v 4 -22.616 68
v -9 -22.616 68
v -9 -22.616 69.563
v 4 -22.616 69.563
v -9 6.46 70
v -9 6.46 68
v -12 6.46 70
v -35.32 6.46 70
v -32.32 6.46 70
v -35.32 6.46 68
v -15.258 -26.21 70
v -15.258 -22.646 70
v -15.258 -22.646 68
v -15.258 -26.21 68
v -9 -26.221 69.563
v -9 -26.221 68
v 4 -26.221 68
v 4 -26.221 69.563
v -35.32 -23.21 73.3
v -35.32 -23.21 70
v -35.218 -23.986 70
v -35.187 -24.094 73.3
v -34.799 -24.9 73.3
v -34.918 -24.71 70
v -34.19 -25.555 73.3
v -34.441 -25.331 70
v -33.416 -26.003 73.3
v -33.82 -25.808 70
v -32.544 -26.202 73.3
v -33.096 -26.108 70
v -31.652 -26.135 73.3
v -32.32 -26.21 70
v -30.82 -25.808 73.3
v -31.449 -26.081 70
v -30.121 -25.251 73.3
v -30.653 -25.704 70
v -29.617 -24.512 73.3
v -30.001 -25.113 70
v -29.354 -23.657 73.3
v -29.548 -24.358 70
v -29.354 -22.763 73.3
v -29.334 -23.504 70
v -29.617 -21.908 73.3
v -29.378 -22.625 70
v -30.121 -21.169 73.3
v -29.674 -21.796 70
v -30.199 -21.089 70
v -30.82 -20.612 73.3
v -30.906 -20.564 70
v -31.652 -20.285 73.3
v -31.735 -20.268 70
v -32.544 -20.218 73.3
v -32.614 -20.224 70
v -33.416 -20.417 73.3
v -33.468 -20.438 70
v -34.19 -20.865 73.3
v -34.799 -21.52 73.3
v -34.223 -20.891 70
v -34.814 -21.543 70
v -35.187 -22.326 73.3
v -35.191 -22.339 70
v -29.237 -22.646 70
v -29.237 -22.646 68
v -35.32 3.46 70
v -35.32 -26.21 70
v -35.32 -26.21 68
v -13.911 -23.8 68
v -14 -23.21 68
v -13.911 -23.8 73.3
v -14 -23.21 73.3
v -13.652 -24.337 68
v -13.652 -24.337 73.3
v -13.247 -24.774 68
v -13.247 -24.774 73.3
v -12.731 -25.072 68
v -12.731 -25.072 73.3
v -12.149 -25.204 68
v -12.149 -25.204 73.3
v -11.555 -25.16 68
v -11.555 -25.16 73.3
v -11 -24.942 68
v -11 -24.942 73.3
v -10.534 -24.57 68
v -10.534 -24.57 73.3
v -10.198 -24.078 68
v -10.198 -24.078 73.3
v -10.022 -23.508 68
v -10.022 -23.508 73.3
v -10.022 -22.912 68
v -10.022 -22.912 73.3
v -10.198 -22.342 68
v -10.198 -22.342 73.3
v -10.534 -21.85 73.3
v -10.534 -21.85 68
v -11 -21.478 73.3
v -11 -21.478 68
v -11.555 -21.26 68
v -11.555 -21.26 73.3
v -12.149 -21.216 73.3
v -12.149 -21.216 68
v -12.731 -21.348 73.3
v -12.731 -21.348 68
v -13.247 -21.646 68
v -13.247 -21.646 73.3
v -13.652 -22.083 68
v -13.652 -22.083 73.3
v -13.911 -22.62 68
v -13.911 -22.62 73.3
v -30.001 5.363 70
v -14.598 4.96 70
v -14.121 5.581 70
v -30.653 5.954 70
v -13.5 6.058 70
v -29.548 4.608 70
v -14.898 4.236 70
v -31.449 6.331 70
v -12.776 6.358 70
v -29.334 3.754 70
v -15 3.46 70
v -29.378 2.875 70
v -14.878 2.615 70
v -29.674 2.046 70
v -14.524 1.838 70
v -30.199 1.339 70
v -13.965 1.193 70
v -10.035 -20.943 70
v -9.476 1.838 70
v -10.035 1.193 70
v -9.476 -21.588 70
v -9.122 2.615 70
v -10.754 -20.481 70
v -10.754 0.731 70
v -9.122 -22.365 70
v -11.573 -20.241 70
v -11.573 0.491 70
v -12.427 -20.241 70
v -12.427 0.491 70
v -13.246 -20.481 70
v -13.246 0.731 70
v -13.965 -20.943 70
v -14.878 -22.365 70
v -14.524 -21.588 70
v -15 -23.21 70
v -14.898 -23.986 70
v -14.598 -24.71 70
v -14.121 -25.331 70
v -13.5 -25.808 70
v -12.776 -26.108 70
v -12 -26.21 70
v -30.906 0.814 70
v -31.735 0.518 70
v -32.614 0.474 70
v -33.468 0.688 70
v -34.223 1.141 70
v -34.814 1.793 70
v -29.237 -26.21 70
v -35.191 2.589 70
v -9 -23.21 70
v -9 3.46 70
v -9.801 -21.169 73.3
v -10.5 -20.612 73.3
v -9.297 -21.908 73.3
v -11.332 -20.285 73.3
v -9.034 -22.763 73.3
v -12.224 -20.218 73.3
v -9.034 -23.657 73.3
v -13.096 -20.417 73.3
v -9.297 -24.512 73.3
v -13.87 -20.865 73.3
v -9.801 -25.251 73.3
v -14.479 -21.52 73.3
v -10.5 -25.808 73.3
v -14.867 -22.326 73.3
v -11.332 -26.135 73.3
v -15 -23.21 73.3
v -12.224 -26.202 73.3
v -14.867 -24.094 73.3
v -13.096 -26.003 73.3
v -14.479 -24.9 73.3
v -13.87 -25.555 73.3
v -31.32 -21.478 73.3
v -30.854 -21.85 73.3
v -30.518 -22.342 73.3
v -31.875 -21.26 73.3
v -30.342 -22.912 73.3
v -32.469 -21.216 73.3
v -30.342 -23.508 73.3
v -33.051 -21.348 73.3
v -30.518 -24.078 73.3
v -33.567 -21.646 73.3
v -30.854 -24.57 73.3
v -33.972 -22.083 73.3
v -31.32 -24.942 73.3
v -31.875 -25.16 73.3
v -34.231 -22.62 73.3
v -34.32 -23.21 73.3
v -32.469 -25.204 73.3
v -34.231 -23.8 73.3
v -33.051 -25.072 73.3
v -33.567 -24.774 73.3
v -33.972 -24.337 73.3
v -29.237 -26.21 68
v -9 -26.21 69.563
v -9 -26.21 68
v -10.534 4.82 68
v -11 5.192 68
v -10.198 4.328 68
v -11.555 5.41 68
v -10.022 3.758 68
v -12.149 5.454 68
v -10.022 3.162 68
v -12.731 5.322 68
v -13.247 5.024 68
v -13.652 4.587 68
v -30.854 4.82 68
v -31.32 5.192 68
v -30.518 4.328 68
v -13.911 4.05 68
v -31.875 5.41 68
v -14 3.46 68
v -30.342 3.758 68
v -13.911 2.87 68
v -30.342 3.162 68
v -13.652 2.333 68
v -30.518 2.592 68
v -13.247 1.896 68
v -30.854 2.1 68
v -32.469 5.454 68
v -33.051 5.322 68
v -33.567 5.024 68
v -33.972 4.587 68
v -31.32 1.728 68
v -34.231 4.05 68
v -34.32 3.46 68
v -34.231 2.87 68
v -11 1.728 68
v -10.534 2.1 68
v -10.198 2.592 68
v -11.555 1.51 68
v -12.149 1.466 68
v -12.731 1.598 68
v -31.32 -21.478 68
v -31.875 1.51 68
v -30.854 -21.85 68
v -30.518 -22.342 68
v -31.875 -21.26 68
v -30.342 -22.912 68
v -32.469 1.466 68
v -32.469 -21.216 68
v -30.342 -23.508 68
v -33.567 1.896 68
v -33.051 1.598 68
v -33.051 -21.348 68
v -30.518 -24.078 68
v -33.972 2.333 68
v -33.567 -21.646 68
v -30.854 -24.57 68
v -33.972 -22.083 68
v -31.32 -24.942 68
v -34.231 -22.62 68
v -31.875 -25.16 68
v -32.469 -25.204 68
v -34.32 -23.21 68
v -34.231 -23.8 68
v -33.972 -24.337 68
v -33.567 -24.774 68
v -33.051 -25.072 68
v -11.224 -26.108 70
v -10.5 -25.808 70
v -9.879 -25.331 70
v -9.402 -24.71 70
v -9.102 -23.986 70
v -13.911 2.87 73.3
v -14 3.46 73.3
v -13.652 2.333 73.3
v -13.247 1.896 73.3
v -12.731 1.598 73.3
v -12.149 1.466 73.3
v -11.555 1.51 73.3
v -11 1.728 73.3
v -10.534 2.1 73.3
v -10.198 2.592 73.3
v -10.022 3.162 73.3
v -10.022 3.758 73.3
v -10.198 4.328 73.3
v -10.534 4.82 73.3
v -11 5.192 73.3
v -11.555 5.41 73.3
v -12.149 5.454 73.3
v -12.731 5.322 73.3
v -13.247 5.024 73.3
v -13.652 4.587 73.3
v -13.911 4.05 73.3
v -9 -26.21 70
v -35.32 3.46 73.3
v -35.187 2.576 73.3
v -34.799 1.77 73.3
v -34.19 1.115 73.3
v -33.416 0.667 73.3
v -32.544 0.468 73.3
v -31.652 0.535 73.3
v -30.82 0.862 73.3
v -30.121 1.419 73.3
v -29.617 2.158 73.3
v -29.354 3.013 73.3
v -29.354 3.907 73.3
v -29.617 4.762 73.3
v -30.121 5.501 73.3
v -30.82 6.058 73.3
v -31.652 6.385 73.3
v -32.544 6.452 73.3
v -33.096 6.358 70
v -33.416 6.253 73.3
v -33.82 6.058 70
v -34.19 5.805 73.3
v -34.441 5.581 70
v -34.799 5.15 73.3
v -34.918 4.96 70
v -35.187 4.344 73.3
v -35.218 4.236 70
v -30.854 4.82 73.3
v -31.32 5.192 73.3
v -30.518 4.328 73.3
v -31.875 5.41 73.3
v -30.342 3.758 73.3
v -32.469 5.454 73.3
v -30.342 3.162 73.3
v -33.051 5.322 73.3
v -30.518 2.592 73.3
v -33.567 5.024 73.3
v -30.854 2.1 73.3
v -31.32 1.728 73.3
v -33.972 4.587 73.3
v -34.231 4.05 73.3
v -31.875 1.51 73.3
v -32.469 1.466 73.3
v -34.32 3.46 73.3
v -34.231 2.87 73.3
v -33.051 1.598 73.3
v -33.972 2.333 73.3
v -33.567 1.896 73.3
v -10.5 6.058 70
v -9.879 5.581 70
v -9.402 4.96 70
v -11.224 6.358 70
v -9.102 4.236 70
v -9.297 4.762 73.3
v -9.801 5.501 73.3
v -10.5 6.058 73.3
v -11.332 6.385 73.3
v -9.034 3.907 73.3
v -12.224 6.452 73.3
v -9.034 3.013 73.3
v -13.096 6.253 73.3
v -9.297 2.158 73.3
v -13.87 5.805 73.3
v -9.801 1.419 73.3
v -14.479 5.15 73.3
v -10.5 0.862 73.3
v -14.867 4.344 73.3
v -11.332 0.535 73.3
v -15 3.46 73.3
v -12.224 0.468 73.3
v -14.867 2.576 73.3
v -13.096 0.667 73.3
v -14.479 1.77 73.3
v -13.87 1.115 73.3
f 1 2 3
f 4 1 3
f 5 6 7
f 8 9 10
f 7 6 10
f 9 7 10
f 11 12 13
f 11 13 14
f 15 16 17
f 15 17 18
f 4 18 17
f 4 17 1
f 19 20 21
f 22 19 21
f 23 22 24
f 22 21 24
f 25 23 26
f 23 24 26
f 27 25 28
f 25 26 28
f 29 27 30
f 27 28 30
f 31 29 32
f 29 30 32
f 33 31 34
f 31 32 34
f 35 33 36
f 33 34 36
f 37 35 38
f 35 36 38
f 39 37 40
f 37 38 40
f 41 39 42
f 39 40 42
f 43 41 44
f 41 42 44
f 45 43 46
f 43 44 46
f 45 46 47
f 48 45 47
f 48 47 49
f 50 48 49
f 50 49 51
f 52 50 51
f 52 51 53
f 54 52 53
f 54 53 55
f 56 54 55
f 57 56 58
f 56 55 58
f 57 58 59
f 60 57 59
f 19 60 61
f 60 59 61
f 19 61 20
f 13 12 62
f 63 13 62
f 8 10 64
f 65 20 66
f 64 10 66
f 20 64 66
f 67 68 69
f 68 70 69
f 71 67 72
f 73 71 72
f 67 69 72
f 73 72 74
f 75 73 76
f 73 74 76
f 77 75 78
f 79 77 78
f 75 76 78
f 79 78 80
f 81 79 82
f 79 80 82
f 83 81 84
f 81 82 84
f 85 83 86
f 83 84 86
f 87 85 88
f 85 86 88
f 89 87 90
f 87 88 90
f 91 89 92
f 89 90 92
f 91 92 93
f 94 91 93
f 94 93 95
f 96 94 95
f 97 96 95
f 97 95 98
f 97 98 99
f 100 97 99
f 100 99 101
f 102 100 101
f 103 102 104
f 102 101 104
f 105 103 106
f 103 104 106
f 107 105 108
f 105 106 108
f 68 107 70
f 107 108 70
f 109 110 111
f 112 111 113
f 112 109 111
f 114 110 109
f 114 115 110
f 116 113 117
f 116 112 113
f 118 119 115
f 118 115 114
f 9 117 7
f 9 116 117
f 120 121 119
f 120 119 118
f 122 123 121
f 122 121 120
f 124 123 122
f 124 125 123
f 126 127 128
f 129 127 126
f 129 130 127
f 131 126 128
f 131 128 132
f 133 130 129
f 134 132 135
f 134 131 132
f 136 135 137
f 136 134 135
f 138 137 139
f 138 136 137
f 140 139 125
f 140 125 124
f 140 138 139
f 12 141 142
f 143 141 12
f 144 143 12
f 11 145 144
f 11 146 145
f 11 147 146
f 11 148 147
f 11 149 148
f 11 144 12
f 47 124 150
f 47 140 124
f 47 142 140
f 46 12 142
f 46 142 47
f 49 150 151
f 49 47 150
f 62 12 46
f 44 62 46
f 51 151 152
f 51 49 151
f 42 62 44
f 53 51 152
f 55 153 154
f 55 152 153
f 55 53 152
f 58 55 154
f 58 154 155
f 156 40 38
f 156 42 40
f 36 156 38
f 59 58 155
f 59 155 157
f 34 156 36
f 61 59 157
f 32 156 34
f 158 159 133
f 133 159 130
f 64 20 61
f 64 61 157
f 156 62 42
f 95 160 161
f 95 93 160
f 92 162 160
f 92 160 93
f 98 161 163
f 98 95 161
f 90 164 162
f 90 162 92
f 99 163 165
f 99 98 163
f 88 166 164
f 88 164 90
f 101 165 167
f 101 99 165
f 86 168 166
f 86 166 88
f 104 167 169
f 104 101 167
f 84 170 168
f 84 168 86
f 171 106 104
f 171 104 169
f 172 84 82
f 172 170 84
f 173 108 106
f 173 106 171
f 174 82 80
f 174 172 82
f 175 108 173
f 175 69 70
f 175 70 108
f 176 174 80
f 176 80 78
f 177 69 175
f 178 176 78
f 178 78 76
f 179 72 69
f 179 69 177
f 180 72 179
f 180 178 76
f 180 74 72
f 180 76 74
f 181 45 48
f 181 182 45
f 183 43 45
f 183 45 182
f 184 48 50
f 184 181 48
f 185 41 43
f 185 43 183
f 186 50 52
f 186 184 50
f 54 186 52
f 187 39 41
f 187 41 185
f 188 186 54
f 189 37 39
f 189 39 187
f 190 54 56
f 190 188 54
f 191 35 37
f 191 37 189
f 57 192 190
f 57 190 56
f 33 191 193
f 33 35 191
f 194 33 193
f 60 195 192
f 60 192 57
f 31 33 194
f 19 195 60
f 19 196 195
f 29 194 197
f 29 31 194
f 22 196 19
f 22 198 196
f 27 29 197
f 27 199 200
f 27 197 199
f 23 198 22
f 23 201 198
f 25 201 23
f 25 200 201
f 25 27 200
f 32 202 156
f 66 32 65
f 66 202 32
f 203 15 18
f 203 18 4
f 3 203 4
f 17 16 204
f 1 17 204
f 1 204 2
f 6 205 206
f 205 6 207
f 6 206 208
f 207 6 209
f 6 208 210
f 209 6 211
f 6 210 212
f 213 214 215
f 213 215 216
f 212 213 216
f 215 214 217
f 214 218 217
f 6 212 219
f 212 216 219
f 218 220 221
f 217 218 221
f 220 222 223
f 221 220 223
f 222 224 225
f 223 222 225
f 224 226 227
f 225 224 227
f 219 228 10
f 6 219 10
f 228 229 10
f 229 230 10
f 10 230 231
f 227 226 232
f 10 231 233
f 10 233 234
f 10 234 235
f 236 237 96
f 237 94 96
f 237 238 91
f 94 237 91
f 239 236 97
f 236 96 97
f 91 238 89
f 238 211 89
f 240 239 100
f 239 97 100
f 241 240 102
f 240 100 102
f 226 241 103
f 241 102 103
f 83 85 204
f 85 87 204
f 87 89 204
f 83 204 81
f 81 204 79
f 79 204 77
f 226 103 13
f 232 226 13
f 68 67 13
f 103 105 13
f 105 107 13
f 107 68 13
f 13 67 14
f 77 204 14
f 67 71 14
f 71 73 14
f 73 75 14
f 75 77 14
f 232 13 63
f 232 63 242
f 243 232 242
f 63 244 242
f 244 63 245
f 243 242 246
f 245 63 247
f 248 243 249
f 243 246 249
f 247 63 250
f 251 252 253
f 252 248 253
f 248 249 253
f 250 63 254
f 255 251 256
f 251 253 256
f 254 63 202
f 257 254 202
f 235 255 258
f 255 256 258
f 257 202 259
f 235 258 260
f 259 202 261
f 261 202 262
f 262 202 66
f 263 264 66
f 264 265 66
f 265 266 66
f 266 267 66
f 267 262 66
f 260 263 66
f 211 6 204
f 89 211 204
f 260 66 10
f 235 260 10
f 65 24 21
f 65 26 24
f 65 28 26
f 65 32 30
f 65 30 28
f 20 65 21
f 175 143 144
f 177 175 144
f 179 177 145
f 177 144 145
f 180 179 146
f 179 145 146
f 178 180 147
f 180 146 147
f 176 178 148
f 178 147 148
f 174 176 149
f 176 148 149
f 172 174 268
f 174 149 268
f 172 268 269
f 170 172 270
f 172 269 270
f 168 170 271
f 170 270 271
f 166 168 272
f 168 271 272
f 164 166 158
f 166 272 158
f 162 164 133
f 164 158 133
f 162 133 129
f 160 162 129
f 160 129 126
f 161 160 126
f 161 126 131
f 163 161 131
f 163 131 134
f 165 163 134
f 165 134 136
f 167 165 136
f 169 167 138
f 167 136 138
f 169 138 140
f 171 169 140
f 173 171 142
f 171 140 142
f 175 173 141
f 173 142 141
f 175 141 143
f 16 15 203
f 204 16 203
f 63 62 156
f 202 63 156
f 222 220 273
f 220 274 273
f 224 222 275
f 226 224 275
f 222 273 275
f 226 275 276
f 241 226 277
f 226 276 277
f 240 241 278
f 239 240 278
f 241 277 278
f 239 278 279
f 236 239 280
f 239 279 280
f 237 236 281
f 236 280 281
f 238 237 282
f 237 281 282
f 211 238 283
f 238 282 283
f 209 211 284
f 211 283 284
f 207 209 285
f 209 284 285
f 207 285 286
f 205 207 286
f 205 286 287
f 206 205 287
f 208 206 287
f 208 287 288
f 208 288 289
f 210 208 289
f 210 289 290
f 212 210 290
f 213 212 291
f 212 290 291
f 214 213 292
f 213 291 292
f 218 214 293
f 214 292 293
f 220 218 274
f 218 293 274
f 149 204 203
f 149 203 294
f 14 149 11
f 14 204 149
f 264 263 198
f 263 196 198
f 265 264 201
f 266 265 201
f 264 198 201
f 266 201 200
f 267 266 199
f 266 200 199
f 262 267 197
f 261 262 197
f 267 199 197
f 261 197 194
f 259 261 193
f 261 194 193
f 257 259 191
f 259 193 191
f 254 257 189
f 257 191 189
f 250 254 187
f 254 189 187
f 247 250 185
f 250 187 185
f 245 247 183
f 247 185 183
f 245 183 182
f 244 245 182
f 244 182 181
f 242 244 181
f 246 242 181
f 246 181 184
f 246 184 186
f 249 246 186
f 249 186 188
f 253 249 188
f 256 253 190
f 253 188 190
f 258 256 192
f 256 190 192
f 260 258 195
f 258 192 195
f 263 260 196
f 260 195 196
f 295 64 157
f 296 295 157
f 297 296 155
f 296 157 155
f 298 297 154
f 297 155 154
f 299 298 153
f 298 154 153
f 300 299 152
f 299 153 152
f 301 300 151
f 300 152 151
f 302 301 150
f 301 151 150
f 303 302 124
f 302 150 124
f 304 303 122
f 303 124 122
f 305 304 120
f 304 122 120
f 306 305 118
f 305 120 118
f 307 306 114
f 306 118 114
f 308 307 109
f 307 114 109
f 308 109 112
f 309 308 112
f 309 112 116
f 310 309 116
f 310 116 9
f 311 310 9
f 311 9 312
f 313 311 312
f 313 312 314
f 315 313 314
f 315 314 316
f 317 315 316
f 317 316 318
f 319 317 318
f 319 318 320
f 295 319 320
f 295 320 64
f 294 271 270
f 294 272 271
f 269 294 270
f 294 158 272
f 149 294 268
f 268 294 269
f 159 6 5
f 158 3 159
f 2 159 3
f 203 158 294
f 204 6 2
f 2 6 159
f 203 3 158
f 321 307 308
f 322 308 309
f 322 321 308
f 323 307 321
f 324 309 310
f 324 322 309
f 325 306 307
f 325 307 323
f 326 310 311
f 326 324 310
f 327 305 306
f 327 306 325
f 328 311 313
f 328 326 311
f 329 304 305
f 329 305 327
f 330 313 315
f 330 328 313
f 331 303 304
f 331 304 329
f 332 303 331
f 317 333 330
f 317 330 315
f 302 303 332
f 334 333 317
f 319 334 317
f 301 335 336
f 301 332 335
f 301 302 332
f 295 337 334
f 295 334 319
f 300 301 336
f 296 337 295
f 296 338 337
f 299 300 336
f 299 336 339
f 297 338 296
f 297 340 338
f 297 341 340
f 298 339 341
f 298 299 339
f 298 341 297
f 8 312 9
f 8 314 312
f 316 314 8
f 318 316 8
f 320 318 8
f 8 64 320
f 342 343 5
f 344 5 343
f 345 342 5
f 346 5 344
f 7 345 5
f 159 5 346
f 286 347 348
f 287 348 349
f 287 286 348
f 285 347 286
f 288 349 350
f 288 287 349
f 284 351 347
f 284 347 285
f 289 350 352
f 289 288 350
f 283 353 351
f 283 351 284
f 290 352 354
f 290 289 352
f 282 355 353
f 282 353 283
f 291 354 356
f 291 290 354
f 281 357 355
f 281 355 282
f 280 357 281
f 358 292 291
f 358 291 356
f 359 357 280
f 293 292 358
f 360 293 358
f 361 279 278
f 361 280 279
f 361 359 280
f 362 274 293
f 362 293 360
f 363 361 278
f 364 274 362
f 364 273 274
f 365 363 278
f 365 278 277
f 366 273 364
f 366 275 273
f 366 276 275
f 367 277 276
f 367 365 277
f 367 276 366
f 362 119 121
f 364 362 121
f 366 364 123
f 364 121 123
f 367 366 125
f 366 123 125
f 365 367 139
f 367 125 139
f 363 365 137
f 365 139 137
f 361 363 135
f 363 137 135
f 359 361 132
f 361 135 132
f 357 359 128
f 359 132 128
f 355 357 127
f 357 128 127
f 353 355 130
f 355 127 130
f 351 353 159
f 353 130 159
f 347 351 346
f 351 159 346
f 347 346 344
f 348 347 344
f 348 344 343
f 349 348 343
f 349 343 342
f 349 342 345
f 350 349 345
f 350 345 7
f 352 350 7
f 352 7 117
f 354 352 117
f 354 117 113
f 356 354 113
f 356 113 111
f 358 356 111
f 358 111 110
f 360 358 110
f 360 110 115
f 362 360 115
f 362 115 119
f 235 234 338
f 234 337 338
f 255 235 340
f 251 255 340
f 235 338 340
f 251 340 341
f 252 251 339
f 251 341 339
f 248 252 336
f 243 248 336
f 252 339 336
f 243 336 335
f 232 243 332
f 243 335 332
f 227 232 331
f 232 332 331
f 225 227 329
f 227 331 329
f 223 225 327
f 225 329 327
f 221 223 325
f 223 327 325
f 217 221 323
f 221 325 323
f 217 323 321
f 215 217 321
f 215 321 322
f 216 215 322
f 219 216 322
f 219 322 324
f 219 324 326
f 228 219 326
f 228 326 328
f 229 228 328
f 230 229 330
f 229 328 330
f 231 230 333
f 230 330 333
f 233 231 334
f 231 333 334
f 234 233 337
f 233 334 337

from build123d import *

# Parameters (mm, degrees)
SKETCH001_W             = 26.32
SKETCH001_H             = 32.67
PAD009_DEPTH            = 2
SKETCH004_R             = 3
SKETCH004_R_2           = 2
PAD010_DEPTH            = 3.3
SKETCH006_W             = 3.605088
SKETCH006_H             = 1.563431
PAD013_DEPTH            = 13
SKETCH015_R             = 2
POCKET_DEPTH            = 5.301
SKETCH016_W             = 13.978614
SKETCH016_H             = 3.56367
POCKET001_DEPTH         = 2.001
BODY002_PLACEMENT_ANGLE = 180


with BuildPart() as part:
    # Sketch001 → Pad009 (new body)
    with BuildSketch(Plane.XY):
        with Locations((12.7, 15.875)):
            Rectangle(SKETCH001_W, SKETCH001_H)
    extrude(amount=PAD009_DEPTH)

    # Sketch004 (on Face6 of Pad009) → Pad010 (join)
    with BuildSketch(Plane.XY.offset(2)):
        with Locations((2.54, 29.21)):
            Circle(SKETCH004_R)
        with Locations((2.54, 29.21)):
            Circle(SKETCH004_R_2, mode=Mode.SUBTRACT)
        with Locations((22.86, 29.21)):
            Circle(SKETCH004_R)
        with Locations((22.86, 29.21)):
            Circle(SKETCH004_R_2, mode=Mode.SUBTRACT)
        with Locations((22.86, 2.54)):
            Circle(SKETCH004_R)
        with Locations((22.86, 2.54)):
            Circle(SKETCH004_R_2, mode=Mode.SUBTRACT)
        with Locations((2.54, 2.54)):
            Circle(SKETCH004_R)
        with Locations((2.54, 2.54)):
            Circle(SKETCH004_R_2, mode=Mode.SUBTRACT)
    extrude(amount=PAD010_DEPTH)

    # Sketch006 (on Face1 of Pad010) → Pad013 (join)
    with BuildSketch(Plane(origin=(-0.46, 0, 0), x_dir=(0, -1, 0), z_dir=(-1, 0, 0))):
        with Locations((-30.41881, 0.781716)):
            Rectangle(SKETCH006_W, SKETCH006_H)
    extrude(amount=PAD013_DEPTH)

    # Sketch015 (on Face22 of Pad013) → Pocket (cut, through all)
    with BuildSketch(Plane.XY.offset(5.3)):
        with Locations((2.54, 29.21)):
            Circle(SKETCH015_R)
        with Locations((22.86, 29.21)):
            Circle(SKETCH015_R)
        with Locations((22.86, 2.54)):
            Circle(SKETCH015_R)
        with Locations((2.54, 2.54)):
            Circle(SKETCH015_R)
    extrude(amount=-POCKET_DEPTH, mode=Mode.SUBTRACT)

    # Sketch016 (on Face7 of Pocket) → Pocket001 (cut, through all)
    with BuildSketch(Plane.XY.offset(2)):
        with Locations((12.78762, 30.428165)):
            Rectangle(SKETCH016_W, SKETCH016_H)
    extrude(amount=-POCKET001_DEPTH, mode=Mode.SUBTRACT)


with BuildPart() as part_1:
    # Body002 placement: moved
    add(part.part.moved(Location((-9.46, 6, 68))).rotate(Axis((-9.46, 6, 68), (0, 0, 1)), BODY002_PLACEMENT_ANGLE))


solid = part_1.part
